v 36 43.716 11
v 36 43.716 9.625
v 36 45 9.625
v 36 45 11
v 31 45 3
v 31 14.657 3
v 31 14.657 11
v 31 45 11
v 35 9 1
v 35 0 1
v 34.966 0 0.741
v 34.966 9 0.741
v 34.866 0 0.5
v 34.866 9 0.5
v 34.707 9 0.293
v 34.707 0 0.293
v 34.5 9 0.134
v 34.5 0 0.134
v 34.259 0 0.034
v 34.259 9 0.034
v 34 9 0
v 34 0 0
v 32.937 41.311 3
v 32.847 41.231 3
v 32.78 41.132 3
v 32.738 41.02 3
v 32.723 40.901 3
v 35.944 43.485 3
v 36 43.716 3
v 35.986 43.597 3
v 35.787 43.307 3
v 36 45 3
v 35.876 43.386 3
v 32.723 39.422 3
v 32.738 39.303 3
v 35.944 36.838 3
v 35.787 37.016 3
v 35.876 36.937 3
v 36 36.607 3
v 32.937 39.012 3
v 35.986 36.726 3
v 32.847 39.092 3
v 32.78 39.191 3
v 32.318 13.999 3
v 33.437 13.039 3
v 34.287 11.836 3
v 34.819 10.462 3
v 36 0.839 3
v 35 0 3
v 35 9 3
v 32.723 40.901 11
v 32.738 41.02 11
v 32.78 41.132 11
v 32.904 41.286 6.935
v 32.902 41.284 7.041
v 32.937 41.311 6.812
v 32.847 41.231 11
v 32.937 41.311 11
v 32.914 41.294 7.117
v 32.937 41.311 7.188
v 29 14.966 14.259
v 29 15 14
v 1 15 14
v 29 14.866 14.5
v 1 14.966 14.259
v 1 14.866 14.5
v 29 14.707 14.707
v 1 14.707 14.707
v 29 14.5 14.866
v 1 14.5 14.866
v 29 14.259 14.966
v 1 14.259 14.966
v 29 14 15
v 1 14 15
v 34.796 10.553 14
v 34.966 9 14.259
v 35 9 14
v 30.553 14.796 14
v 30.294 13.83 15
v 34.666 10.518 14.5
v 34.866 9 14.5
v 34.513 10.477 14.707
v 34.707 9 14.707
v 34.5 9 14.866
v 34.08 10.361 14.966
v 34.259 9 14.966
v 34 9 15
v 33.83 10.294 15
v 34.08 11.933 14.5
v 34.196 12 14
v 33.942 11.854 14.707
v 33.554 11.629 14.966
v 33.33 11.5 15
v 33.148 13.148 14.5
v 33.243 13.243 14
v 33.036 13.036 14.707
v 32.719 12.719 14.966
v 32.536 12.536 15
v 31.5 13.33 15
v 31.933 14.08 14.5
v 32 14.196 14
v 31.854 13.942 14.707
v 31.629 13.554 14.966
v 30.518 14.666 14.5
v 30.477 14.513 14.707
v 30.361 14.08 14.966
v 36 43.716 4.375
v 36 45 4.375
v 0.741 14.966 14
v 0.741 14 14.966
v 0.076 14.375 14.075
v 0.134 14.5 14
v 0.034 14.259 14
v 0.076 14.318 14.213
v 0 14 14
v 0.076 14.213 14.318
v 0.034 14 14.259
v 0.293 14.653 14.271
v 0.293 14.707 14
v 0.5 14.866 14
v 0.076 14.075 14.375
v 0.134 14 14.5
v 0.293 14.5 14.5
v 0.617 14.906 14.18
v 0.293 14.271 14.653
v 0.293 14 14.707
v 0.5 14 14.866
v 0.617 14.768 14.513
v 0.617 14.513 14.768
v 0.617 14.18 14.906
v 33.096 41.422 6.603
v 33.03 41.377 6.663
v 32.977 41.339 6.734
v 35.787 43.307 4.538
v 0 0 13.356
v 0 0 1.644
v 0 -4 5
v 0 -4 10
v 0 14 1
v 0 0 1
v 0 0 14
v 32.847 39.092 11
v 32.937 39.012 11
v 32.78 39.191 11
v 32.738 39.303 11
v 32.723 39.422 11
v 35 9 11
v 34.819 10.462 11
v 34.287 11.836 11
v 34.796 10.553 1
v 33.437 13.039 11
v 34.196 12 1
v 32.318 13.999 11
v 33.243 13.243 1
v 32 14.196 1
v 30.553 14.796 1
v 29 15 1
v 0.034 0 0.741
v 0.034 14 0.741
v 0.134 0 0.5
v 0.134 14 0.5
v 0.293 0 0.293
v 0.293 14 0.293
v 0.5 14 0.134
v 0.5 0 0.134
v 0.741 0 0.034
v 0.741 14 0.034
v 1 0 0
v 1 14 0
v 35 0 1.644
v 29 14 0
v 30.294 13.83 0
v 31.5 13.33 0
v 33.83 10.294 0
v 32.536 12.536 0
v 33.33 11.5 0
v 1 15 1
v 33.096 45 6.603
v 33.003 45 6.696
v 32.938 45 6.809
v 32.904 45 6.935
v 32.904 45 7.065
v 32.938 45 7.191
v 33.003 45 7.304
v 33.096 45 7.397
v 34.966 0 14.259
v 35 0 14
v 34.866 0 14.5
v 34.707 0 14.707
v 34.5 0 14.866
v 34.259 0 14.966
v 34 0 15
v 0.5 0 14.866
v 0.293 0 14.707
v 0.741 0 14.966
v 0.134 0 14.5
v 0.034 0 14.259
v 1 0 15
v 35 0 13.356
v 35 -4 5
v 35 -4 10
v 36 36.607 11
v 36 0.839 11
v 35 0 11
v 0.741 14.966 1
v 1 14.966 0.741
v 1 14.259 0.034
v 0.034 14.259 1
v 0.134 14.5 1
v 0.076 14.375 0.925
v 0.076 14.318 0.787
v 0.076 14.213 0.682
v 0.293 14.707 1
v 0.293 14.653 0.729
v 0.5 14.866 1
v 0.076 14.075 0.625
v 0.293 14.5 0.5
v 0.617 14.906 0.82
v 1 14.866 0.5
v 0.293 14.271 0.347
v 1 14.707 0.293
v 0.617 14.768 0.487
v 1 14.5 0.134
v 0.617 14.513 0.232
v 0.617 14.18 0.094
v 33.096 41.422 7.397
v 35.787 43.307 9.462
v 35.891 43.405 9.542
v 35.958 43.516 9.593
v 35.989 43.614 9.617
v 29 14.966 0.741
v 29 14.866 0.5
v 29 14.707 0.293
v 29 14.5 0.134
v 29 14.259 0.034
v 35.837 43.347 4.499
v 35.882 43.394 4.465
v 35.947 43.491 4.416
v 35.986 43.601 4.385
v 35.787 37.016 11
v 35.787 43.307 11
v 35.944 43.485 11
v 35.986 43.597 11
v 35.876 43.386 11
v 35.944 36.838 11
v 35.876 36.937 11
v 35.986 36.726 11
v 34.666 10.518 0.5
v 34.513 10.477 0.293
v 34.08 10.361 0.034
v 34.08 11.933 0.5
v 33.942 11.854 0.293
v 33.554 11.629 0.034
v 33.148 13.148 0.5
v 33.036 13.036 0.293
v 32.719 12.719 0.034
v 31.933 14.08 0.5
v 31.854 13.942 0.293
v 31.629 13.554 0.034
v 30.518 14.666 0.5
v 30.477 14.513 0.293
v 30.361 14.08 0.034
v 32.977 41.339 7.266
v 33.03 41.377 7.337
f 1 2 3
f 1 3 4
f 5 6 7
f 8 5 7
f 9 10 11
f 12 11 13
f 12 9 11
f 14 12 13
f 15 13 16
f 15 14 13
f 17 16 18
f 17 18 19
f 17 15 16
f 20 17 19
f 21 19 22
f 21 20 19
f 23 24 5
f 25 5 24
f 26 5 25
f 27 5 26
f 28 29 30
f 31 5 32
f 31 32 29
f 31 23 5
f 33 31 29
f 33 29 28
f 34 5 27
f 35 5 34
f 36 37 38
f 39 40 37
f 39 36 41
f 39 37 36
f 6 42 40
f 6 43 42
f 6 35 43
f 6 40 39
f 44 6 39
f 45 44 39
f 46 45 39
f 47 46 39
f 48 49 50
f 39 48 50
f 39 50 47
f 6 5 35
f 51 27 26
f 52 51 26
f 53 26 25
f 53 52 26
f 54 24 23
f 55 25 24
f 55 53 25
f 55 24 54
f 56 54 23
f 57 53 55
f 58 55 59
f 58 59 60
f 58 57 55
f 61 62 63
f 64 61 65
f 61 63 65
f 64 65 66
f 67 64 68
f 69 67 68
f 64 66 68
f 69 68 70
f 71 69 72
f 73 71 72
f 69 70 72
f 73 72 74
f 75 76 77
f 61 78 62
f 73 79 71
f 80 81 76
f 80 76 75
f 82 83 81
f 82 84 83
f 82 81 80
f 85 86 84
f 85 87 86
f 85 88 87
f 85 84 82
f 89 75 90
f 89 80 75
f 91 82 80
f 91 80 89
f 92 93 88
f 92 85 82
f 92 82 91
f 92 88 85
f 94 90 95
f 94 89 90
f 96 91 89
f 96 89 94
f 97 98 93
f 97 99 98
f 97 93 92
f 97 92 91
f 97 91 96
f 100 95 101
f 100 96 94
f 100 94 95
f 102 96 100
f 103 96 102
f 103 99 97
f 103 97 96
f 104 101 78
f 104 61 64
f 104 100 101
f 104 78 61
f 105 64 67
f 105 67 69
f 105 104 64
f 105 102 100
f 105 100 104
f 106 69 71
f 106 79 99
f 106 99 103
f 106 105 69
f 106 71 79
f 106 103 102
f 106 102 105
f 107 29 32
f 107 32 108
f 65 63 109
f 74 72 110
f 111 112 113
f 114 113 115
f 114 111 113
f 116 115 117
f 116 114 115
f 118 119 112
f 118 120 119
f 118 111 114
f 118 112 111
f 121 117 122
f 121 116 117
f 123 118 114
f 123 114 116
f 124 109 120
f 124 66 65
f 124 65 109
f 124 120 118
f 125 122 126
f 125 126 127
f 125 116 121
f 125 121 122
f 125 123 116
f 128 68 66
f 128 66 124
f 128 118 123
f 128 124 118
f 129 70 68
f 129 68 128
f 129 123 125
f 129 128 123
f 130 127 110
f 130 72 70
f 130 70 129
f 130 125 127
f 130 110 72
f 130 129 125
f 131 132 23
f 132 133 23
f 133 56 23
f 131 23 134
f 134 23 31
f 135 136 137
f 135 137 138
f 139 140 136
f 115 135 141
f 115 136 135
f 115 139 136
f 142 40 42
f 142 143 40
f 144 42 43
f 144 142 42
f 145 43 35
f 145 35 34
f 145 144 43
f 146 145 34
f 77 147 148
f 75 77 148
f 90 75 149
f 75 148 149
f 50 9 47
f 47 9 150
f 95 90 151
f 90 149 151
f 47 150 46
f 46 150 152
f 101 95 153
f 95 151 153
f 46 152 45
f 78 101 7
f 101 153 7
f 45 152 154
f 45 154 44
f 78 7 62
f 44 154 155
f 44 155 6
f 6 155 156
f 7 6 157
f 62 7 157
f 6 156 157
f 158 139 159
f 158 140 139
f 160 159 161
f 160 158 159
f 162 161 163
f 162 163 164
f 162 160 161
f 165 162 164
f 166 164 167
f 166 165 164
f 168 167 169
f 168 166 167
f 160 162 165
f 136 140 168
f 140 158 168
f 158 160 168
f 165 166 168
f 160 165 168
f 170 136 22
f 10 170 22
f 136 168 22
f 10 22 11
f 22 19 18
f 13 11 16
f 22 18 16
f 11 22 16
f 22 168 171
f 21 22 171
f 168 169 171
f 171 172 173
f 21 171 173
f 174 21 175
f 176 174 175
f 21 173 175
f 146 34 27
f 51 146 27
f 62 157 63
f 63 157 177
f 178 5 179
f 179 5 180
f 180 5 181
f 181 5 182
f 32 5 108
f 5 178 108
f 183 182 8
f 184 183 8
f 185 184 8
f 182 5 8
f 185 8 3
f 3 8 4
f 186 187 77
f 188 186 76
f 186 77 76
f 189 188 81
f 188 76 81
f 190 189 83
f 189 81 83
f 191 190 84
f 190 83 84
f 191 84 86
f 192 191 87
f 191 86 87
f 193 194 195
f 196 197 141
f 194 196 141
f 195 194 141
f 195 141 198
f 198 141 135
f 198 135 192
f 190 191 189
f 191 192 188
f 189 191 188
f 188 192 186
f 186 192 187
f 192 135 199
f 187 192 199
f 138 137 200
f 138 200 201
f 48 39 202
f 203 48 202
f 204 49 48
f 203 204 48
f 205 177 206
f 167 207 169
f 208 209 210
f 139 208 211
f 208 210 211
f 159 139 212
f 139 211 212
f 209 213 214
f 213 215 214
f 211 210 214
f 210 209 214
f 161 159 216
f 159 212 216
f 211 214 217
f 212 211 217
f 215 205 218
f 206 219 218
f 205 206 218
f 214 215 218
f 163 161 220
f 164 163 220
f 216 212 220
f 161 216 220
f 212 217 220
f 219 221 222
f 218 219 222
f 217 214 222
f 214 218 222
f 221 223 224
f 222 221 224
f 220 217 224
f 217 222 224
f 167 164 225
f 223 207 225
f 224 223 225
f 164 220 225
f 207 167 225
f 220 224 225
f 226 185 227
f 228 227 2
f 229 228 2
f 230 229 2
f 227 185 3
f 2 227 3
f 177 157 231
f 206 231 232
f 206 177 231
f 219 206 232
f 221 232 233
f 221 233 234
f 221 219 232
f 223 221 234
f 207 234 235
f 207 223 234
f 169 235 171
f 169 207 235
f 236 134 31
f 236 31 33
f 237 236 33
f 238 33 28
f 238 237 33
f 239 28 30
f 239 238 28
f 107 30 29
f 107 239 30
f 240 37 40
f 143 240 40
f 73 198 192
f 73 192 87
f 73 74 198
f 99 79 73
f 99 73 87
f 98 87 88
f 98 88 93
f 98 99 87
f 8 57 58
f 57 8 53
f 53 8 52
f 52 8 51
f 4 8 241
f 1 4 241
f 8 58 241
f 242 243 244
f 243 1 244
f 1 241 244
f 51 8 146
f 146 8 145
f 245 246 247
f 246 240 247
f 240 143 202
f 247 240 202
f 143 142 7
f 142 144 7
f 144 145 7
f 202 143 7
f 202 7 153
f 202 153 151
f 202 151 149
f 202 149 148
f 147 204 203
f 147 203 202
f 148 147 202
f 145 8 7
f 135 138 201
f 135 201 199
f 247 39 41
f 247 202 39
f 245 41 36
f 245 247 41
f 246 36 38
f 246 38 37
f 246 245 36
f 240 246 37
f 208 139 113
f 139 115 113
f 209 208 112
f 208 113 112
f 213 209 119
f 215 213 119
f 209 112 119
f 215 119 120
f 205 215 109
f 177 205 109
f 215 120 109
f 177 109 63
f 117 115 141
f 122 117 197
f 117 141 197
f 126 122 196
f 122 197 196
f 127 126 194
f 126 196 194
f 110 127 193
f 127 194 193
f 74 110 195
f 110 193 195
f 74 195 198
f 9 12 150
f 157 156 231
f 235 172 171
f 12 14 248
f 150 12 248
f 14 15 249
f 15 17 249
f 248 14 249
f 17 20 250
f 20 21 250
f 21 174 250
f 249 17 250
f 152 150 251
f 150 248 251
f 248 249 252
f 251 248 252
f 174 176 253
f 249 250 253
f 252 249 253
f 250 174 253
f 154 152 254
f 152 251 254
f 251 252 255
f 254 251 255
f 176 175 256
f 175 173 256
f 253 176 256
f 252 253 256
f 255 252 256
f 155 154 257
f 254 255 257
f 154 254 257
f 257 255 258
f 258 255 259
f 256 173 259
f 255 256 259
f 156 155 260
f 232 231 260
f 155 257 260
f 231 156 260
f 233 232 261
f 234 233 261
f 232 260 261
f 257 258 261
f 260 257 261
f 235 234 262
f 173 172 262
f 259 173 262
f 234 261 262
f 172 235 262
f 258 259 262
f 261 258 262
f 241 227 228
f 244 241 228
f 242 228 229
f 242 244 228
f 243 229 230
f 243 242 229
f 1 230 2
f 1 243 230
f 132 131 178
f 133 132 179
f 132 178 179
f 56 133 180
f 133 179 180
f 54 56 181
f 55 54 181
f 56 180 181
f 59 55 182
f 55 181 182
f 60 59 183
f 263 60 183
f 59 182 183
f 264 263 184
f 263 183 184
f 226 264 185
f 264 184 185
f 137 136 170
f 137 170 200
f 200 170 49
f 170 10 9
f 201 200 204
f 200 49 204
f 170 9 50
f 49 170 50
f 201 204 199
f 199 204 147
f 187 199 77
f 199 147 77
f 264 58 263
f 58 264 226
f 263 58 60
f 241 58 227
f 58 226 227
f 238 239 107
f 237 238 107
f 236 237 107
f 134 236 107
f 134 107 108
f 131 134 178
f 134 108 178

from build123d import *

# Parameters (mm, degrees)
BOSS_EXTRU_1_DEPTH      = 15
ESQUISSE2_W             = 5
ESQUISSE2_H             = 8
BOSS_EXTRU_2_DEPTH      = 45
ENL_V_MAT_EXTRU_1_DEPTH = 59.864250611
CONG_1_R                = 0.5
ENL_V_MAT_EXTRU_2_DEPTH = 5
BOSS_EXTRU_4_DEPTH      = 35
CONG_3_R                = 1
D_POUILLE2_ANGLE        = 40


with BuildPart() as part:
    # Esquisse1 → Boss.-Extru.1 (new body)
    with BuildSketch(Plane.XY):
        with BuildLine():
            Line((0, 0), (35, 0))
            Line((35, 0), (35, 9))
            ThreePointArc((35, 9), (33.242640687, 13.242640687), (29, 15))
            Line((29, 15), (0, 15))
            Line((0, 15), (0, 0))
        make_face()
    extrude(amount=BOSS_EXTRU_1_DEPTH)

    # Esquisse2 → Boss.-Extru.2 (add)
    with BuildSketch(Plane.XZ):
        with Locations((33.5, 7)):
            Rectangle(ESQUISSE2_W, ESQUISSE2_H)
    extrude(amount=-BOSS_EXTRU_2_DEPTH)

    # Esquisse3 → Enlèv. mat.-Extru.1 (cut, through all)
    with BuildSketch(Plane(origin=(0, 0, 3), x_dir=(-1, 0, 0), z_dir=(0, 0, -1))):
        Polygon((-36, 43.455794604), (-36, 36.867183113), (-32.723391823, 39.161488859), (-32.723391823, 41.161488859), align=None)
    extrude(amount=-ENL_V_MAT_EXTRU_1_DEPTH, mode=Mode.SUBTRACT)

    # Congé1
    cong_1_edges = [part.edges().sort_by_distance(p)[0] for p in [
        (36, 36.867183113, 7),
        (36, 43.455794604, 7),
        (32.723391823, 41.161488859, 7),
        (32.723391823, 39.161488859, 7),
    ]]
    fillet(cong_1_edges, radius=CONG_1_R)

    # Esquisse4 → Enlèv. mat.-Extru.2 (cut)
    with BuildSketch(Plane(origin=(0, 45, 0), x_dir=(1, 0, 0), z_dir=(0, 1, 0))):
        with BuildLine():
            Line((36, -4.374713624), (33.095619285, -6.60332333))
            ThreePointArc((33.095619285, -6.60332333), (32.9, -7), (33.095619285, -7.39667667))
            Line((33.095619285, -7.39667667), (36, -9.625286376))
            Line((36, -9.625286376), (36, -4.374713624))
        make_face()
    extrude(amount=-ENL_V_MAT_EXTRU_2_DEPTH, mode=Mode.SUBTRACT)

    # Esquisse6 → Boss.-Extru.4 (add)
    with BuildSketch(Plane.ZY):
        Polygon((13.356398525, 0), (1.643601475, 0), (5, -4), (10, -4), align=None)
    extrude(amount=-BOSS_EXTRU_4_DEPTH)

    # Congé3
    cong_3_edges = [part.edges().sort_by_distance(p)[0] for p in [
        (35, 4.5, 0),
        (33.242640687, 13.242640687, 0),
        (14.5, 15, 0),
        (35, 4.5, 15),
        (33.242640687, 13.242640687, 15),
        (14.5, 15, 15),
        (0, 15, 7.5),
        (0, 7.5, 15),
        (0, 7.5, 0),
    ]]
    fillet(cong_3_edges, radius=CONG_3_R)

    # Dépouille2
    d_pouille2_faces = [part.faces().sort_by_distance(p)[0] for p in [
        (35.5, 0, 7),
    ]]
    draft(d_pouille2_faces, Plane(origin=(35, 0, 15), x_dir=(0, 0, 1), z_dir=(1, 0, 0)), D_POUILLE2_ANGLE)


solid = part.part
